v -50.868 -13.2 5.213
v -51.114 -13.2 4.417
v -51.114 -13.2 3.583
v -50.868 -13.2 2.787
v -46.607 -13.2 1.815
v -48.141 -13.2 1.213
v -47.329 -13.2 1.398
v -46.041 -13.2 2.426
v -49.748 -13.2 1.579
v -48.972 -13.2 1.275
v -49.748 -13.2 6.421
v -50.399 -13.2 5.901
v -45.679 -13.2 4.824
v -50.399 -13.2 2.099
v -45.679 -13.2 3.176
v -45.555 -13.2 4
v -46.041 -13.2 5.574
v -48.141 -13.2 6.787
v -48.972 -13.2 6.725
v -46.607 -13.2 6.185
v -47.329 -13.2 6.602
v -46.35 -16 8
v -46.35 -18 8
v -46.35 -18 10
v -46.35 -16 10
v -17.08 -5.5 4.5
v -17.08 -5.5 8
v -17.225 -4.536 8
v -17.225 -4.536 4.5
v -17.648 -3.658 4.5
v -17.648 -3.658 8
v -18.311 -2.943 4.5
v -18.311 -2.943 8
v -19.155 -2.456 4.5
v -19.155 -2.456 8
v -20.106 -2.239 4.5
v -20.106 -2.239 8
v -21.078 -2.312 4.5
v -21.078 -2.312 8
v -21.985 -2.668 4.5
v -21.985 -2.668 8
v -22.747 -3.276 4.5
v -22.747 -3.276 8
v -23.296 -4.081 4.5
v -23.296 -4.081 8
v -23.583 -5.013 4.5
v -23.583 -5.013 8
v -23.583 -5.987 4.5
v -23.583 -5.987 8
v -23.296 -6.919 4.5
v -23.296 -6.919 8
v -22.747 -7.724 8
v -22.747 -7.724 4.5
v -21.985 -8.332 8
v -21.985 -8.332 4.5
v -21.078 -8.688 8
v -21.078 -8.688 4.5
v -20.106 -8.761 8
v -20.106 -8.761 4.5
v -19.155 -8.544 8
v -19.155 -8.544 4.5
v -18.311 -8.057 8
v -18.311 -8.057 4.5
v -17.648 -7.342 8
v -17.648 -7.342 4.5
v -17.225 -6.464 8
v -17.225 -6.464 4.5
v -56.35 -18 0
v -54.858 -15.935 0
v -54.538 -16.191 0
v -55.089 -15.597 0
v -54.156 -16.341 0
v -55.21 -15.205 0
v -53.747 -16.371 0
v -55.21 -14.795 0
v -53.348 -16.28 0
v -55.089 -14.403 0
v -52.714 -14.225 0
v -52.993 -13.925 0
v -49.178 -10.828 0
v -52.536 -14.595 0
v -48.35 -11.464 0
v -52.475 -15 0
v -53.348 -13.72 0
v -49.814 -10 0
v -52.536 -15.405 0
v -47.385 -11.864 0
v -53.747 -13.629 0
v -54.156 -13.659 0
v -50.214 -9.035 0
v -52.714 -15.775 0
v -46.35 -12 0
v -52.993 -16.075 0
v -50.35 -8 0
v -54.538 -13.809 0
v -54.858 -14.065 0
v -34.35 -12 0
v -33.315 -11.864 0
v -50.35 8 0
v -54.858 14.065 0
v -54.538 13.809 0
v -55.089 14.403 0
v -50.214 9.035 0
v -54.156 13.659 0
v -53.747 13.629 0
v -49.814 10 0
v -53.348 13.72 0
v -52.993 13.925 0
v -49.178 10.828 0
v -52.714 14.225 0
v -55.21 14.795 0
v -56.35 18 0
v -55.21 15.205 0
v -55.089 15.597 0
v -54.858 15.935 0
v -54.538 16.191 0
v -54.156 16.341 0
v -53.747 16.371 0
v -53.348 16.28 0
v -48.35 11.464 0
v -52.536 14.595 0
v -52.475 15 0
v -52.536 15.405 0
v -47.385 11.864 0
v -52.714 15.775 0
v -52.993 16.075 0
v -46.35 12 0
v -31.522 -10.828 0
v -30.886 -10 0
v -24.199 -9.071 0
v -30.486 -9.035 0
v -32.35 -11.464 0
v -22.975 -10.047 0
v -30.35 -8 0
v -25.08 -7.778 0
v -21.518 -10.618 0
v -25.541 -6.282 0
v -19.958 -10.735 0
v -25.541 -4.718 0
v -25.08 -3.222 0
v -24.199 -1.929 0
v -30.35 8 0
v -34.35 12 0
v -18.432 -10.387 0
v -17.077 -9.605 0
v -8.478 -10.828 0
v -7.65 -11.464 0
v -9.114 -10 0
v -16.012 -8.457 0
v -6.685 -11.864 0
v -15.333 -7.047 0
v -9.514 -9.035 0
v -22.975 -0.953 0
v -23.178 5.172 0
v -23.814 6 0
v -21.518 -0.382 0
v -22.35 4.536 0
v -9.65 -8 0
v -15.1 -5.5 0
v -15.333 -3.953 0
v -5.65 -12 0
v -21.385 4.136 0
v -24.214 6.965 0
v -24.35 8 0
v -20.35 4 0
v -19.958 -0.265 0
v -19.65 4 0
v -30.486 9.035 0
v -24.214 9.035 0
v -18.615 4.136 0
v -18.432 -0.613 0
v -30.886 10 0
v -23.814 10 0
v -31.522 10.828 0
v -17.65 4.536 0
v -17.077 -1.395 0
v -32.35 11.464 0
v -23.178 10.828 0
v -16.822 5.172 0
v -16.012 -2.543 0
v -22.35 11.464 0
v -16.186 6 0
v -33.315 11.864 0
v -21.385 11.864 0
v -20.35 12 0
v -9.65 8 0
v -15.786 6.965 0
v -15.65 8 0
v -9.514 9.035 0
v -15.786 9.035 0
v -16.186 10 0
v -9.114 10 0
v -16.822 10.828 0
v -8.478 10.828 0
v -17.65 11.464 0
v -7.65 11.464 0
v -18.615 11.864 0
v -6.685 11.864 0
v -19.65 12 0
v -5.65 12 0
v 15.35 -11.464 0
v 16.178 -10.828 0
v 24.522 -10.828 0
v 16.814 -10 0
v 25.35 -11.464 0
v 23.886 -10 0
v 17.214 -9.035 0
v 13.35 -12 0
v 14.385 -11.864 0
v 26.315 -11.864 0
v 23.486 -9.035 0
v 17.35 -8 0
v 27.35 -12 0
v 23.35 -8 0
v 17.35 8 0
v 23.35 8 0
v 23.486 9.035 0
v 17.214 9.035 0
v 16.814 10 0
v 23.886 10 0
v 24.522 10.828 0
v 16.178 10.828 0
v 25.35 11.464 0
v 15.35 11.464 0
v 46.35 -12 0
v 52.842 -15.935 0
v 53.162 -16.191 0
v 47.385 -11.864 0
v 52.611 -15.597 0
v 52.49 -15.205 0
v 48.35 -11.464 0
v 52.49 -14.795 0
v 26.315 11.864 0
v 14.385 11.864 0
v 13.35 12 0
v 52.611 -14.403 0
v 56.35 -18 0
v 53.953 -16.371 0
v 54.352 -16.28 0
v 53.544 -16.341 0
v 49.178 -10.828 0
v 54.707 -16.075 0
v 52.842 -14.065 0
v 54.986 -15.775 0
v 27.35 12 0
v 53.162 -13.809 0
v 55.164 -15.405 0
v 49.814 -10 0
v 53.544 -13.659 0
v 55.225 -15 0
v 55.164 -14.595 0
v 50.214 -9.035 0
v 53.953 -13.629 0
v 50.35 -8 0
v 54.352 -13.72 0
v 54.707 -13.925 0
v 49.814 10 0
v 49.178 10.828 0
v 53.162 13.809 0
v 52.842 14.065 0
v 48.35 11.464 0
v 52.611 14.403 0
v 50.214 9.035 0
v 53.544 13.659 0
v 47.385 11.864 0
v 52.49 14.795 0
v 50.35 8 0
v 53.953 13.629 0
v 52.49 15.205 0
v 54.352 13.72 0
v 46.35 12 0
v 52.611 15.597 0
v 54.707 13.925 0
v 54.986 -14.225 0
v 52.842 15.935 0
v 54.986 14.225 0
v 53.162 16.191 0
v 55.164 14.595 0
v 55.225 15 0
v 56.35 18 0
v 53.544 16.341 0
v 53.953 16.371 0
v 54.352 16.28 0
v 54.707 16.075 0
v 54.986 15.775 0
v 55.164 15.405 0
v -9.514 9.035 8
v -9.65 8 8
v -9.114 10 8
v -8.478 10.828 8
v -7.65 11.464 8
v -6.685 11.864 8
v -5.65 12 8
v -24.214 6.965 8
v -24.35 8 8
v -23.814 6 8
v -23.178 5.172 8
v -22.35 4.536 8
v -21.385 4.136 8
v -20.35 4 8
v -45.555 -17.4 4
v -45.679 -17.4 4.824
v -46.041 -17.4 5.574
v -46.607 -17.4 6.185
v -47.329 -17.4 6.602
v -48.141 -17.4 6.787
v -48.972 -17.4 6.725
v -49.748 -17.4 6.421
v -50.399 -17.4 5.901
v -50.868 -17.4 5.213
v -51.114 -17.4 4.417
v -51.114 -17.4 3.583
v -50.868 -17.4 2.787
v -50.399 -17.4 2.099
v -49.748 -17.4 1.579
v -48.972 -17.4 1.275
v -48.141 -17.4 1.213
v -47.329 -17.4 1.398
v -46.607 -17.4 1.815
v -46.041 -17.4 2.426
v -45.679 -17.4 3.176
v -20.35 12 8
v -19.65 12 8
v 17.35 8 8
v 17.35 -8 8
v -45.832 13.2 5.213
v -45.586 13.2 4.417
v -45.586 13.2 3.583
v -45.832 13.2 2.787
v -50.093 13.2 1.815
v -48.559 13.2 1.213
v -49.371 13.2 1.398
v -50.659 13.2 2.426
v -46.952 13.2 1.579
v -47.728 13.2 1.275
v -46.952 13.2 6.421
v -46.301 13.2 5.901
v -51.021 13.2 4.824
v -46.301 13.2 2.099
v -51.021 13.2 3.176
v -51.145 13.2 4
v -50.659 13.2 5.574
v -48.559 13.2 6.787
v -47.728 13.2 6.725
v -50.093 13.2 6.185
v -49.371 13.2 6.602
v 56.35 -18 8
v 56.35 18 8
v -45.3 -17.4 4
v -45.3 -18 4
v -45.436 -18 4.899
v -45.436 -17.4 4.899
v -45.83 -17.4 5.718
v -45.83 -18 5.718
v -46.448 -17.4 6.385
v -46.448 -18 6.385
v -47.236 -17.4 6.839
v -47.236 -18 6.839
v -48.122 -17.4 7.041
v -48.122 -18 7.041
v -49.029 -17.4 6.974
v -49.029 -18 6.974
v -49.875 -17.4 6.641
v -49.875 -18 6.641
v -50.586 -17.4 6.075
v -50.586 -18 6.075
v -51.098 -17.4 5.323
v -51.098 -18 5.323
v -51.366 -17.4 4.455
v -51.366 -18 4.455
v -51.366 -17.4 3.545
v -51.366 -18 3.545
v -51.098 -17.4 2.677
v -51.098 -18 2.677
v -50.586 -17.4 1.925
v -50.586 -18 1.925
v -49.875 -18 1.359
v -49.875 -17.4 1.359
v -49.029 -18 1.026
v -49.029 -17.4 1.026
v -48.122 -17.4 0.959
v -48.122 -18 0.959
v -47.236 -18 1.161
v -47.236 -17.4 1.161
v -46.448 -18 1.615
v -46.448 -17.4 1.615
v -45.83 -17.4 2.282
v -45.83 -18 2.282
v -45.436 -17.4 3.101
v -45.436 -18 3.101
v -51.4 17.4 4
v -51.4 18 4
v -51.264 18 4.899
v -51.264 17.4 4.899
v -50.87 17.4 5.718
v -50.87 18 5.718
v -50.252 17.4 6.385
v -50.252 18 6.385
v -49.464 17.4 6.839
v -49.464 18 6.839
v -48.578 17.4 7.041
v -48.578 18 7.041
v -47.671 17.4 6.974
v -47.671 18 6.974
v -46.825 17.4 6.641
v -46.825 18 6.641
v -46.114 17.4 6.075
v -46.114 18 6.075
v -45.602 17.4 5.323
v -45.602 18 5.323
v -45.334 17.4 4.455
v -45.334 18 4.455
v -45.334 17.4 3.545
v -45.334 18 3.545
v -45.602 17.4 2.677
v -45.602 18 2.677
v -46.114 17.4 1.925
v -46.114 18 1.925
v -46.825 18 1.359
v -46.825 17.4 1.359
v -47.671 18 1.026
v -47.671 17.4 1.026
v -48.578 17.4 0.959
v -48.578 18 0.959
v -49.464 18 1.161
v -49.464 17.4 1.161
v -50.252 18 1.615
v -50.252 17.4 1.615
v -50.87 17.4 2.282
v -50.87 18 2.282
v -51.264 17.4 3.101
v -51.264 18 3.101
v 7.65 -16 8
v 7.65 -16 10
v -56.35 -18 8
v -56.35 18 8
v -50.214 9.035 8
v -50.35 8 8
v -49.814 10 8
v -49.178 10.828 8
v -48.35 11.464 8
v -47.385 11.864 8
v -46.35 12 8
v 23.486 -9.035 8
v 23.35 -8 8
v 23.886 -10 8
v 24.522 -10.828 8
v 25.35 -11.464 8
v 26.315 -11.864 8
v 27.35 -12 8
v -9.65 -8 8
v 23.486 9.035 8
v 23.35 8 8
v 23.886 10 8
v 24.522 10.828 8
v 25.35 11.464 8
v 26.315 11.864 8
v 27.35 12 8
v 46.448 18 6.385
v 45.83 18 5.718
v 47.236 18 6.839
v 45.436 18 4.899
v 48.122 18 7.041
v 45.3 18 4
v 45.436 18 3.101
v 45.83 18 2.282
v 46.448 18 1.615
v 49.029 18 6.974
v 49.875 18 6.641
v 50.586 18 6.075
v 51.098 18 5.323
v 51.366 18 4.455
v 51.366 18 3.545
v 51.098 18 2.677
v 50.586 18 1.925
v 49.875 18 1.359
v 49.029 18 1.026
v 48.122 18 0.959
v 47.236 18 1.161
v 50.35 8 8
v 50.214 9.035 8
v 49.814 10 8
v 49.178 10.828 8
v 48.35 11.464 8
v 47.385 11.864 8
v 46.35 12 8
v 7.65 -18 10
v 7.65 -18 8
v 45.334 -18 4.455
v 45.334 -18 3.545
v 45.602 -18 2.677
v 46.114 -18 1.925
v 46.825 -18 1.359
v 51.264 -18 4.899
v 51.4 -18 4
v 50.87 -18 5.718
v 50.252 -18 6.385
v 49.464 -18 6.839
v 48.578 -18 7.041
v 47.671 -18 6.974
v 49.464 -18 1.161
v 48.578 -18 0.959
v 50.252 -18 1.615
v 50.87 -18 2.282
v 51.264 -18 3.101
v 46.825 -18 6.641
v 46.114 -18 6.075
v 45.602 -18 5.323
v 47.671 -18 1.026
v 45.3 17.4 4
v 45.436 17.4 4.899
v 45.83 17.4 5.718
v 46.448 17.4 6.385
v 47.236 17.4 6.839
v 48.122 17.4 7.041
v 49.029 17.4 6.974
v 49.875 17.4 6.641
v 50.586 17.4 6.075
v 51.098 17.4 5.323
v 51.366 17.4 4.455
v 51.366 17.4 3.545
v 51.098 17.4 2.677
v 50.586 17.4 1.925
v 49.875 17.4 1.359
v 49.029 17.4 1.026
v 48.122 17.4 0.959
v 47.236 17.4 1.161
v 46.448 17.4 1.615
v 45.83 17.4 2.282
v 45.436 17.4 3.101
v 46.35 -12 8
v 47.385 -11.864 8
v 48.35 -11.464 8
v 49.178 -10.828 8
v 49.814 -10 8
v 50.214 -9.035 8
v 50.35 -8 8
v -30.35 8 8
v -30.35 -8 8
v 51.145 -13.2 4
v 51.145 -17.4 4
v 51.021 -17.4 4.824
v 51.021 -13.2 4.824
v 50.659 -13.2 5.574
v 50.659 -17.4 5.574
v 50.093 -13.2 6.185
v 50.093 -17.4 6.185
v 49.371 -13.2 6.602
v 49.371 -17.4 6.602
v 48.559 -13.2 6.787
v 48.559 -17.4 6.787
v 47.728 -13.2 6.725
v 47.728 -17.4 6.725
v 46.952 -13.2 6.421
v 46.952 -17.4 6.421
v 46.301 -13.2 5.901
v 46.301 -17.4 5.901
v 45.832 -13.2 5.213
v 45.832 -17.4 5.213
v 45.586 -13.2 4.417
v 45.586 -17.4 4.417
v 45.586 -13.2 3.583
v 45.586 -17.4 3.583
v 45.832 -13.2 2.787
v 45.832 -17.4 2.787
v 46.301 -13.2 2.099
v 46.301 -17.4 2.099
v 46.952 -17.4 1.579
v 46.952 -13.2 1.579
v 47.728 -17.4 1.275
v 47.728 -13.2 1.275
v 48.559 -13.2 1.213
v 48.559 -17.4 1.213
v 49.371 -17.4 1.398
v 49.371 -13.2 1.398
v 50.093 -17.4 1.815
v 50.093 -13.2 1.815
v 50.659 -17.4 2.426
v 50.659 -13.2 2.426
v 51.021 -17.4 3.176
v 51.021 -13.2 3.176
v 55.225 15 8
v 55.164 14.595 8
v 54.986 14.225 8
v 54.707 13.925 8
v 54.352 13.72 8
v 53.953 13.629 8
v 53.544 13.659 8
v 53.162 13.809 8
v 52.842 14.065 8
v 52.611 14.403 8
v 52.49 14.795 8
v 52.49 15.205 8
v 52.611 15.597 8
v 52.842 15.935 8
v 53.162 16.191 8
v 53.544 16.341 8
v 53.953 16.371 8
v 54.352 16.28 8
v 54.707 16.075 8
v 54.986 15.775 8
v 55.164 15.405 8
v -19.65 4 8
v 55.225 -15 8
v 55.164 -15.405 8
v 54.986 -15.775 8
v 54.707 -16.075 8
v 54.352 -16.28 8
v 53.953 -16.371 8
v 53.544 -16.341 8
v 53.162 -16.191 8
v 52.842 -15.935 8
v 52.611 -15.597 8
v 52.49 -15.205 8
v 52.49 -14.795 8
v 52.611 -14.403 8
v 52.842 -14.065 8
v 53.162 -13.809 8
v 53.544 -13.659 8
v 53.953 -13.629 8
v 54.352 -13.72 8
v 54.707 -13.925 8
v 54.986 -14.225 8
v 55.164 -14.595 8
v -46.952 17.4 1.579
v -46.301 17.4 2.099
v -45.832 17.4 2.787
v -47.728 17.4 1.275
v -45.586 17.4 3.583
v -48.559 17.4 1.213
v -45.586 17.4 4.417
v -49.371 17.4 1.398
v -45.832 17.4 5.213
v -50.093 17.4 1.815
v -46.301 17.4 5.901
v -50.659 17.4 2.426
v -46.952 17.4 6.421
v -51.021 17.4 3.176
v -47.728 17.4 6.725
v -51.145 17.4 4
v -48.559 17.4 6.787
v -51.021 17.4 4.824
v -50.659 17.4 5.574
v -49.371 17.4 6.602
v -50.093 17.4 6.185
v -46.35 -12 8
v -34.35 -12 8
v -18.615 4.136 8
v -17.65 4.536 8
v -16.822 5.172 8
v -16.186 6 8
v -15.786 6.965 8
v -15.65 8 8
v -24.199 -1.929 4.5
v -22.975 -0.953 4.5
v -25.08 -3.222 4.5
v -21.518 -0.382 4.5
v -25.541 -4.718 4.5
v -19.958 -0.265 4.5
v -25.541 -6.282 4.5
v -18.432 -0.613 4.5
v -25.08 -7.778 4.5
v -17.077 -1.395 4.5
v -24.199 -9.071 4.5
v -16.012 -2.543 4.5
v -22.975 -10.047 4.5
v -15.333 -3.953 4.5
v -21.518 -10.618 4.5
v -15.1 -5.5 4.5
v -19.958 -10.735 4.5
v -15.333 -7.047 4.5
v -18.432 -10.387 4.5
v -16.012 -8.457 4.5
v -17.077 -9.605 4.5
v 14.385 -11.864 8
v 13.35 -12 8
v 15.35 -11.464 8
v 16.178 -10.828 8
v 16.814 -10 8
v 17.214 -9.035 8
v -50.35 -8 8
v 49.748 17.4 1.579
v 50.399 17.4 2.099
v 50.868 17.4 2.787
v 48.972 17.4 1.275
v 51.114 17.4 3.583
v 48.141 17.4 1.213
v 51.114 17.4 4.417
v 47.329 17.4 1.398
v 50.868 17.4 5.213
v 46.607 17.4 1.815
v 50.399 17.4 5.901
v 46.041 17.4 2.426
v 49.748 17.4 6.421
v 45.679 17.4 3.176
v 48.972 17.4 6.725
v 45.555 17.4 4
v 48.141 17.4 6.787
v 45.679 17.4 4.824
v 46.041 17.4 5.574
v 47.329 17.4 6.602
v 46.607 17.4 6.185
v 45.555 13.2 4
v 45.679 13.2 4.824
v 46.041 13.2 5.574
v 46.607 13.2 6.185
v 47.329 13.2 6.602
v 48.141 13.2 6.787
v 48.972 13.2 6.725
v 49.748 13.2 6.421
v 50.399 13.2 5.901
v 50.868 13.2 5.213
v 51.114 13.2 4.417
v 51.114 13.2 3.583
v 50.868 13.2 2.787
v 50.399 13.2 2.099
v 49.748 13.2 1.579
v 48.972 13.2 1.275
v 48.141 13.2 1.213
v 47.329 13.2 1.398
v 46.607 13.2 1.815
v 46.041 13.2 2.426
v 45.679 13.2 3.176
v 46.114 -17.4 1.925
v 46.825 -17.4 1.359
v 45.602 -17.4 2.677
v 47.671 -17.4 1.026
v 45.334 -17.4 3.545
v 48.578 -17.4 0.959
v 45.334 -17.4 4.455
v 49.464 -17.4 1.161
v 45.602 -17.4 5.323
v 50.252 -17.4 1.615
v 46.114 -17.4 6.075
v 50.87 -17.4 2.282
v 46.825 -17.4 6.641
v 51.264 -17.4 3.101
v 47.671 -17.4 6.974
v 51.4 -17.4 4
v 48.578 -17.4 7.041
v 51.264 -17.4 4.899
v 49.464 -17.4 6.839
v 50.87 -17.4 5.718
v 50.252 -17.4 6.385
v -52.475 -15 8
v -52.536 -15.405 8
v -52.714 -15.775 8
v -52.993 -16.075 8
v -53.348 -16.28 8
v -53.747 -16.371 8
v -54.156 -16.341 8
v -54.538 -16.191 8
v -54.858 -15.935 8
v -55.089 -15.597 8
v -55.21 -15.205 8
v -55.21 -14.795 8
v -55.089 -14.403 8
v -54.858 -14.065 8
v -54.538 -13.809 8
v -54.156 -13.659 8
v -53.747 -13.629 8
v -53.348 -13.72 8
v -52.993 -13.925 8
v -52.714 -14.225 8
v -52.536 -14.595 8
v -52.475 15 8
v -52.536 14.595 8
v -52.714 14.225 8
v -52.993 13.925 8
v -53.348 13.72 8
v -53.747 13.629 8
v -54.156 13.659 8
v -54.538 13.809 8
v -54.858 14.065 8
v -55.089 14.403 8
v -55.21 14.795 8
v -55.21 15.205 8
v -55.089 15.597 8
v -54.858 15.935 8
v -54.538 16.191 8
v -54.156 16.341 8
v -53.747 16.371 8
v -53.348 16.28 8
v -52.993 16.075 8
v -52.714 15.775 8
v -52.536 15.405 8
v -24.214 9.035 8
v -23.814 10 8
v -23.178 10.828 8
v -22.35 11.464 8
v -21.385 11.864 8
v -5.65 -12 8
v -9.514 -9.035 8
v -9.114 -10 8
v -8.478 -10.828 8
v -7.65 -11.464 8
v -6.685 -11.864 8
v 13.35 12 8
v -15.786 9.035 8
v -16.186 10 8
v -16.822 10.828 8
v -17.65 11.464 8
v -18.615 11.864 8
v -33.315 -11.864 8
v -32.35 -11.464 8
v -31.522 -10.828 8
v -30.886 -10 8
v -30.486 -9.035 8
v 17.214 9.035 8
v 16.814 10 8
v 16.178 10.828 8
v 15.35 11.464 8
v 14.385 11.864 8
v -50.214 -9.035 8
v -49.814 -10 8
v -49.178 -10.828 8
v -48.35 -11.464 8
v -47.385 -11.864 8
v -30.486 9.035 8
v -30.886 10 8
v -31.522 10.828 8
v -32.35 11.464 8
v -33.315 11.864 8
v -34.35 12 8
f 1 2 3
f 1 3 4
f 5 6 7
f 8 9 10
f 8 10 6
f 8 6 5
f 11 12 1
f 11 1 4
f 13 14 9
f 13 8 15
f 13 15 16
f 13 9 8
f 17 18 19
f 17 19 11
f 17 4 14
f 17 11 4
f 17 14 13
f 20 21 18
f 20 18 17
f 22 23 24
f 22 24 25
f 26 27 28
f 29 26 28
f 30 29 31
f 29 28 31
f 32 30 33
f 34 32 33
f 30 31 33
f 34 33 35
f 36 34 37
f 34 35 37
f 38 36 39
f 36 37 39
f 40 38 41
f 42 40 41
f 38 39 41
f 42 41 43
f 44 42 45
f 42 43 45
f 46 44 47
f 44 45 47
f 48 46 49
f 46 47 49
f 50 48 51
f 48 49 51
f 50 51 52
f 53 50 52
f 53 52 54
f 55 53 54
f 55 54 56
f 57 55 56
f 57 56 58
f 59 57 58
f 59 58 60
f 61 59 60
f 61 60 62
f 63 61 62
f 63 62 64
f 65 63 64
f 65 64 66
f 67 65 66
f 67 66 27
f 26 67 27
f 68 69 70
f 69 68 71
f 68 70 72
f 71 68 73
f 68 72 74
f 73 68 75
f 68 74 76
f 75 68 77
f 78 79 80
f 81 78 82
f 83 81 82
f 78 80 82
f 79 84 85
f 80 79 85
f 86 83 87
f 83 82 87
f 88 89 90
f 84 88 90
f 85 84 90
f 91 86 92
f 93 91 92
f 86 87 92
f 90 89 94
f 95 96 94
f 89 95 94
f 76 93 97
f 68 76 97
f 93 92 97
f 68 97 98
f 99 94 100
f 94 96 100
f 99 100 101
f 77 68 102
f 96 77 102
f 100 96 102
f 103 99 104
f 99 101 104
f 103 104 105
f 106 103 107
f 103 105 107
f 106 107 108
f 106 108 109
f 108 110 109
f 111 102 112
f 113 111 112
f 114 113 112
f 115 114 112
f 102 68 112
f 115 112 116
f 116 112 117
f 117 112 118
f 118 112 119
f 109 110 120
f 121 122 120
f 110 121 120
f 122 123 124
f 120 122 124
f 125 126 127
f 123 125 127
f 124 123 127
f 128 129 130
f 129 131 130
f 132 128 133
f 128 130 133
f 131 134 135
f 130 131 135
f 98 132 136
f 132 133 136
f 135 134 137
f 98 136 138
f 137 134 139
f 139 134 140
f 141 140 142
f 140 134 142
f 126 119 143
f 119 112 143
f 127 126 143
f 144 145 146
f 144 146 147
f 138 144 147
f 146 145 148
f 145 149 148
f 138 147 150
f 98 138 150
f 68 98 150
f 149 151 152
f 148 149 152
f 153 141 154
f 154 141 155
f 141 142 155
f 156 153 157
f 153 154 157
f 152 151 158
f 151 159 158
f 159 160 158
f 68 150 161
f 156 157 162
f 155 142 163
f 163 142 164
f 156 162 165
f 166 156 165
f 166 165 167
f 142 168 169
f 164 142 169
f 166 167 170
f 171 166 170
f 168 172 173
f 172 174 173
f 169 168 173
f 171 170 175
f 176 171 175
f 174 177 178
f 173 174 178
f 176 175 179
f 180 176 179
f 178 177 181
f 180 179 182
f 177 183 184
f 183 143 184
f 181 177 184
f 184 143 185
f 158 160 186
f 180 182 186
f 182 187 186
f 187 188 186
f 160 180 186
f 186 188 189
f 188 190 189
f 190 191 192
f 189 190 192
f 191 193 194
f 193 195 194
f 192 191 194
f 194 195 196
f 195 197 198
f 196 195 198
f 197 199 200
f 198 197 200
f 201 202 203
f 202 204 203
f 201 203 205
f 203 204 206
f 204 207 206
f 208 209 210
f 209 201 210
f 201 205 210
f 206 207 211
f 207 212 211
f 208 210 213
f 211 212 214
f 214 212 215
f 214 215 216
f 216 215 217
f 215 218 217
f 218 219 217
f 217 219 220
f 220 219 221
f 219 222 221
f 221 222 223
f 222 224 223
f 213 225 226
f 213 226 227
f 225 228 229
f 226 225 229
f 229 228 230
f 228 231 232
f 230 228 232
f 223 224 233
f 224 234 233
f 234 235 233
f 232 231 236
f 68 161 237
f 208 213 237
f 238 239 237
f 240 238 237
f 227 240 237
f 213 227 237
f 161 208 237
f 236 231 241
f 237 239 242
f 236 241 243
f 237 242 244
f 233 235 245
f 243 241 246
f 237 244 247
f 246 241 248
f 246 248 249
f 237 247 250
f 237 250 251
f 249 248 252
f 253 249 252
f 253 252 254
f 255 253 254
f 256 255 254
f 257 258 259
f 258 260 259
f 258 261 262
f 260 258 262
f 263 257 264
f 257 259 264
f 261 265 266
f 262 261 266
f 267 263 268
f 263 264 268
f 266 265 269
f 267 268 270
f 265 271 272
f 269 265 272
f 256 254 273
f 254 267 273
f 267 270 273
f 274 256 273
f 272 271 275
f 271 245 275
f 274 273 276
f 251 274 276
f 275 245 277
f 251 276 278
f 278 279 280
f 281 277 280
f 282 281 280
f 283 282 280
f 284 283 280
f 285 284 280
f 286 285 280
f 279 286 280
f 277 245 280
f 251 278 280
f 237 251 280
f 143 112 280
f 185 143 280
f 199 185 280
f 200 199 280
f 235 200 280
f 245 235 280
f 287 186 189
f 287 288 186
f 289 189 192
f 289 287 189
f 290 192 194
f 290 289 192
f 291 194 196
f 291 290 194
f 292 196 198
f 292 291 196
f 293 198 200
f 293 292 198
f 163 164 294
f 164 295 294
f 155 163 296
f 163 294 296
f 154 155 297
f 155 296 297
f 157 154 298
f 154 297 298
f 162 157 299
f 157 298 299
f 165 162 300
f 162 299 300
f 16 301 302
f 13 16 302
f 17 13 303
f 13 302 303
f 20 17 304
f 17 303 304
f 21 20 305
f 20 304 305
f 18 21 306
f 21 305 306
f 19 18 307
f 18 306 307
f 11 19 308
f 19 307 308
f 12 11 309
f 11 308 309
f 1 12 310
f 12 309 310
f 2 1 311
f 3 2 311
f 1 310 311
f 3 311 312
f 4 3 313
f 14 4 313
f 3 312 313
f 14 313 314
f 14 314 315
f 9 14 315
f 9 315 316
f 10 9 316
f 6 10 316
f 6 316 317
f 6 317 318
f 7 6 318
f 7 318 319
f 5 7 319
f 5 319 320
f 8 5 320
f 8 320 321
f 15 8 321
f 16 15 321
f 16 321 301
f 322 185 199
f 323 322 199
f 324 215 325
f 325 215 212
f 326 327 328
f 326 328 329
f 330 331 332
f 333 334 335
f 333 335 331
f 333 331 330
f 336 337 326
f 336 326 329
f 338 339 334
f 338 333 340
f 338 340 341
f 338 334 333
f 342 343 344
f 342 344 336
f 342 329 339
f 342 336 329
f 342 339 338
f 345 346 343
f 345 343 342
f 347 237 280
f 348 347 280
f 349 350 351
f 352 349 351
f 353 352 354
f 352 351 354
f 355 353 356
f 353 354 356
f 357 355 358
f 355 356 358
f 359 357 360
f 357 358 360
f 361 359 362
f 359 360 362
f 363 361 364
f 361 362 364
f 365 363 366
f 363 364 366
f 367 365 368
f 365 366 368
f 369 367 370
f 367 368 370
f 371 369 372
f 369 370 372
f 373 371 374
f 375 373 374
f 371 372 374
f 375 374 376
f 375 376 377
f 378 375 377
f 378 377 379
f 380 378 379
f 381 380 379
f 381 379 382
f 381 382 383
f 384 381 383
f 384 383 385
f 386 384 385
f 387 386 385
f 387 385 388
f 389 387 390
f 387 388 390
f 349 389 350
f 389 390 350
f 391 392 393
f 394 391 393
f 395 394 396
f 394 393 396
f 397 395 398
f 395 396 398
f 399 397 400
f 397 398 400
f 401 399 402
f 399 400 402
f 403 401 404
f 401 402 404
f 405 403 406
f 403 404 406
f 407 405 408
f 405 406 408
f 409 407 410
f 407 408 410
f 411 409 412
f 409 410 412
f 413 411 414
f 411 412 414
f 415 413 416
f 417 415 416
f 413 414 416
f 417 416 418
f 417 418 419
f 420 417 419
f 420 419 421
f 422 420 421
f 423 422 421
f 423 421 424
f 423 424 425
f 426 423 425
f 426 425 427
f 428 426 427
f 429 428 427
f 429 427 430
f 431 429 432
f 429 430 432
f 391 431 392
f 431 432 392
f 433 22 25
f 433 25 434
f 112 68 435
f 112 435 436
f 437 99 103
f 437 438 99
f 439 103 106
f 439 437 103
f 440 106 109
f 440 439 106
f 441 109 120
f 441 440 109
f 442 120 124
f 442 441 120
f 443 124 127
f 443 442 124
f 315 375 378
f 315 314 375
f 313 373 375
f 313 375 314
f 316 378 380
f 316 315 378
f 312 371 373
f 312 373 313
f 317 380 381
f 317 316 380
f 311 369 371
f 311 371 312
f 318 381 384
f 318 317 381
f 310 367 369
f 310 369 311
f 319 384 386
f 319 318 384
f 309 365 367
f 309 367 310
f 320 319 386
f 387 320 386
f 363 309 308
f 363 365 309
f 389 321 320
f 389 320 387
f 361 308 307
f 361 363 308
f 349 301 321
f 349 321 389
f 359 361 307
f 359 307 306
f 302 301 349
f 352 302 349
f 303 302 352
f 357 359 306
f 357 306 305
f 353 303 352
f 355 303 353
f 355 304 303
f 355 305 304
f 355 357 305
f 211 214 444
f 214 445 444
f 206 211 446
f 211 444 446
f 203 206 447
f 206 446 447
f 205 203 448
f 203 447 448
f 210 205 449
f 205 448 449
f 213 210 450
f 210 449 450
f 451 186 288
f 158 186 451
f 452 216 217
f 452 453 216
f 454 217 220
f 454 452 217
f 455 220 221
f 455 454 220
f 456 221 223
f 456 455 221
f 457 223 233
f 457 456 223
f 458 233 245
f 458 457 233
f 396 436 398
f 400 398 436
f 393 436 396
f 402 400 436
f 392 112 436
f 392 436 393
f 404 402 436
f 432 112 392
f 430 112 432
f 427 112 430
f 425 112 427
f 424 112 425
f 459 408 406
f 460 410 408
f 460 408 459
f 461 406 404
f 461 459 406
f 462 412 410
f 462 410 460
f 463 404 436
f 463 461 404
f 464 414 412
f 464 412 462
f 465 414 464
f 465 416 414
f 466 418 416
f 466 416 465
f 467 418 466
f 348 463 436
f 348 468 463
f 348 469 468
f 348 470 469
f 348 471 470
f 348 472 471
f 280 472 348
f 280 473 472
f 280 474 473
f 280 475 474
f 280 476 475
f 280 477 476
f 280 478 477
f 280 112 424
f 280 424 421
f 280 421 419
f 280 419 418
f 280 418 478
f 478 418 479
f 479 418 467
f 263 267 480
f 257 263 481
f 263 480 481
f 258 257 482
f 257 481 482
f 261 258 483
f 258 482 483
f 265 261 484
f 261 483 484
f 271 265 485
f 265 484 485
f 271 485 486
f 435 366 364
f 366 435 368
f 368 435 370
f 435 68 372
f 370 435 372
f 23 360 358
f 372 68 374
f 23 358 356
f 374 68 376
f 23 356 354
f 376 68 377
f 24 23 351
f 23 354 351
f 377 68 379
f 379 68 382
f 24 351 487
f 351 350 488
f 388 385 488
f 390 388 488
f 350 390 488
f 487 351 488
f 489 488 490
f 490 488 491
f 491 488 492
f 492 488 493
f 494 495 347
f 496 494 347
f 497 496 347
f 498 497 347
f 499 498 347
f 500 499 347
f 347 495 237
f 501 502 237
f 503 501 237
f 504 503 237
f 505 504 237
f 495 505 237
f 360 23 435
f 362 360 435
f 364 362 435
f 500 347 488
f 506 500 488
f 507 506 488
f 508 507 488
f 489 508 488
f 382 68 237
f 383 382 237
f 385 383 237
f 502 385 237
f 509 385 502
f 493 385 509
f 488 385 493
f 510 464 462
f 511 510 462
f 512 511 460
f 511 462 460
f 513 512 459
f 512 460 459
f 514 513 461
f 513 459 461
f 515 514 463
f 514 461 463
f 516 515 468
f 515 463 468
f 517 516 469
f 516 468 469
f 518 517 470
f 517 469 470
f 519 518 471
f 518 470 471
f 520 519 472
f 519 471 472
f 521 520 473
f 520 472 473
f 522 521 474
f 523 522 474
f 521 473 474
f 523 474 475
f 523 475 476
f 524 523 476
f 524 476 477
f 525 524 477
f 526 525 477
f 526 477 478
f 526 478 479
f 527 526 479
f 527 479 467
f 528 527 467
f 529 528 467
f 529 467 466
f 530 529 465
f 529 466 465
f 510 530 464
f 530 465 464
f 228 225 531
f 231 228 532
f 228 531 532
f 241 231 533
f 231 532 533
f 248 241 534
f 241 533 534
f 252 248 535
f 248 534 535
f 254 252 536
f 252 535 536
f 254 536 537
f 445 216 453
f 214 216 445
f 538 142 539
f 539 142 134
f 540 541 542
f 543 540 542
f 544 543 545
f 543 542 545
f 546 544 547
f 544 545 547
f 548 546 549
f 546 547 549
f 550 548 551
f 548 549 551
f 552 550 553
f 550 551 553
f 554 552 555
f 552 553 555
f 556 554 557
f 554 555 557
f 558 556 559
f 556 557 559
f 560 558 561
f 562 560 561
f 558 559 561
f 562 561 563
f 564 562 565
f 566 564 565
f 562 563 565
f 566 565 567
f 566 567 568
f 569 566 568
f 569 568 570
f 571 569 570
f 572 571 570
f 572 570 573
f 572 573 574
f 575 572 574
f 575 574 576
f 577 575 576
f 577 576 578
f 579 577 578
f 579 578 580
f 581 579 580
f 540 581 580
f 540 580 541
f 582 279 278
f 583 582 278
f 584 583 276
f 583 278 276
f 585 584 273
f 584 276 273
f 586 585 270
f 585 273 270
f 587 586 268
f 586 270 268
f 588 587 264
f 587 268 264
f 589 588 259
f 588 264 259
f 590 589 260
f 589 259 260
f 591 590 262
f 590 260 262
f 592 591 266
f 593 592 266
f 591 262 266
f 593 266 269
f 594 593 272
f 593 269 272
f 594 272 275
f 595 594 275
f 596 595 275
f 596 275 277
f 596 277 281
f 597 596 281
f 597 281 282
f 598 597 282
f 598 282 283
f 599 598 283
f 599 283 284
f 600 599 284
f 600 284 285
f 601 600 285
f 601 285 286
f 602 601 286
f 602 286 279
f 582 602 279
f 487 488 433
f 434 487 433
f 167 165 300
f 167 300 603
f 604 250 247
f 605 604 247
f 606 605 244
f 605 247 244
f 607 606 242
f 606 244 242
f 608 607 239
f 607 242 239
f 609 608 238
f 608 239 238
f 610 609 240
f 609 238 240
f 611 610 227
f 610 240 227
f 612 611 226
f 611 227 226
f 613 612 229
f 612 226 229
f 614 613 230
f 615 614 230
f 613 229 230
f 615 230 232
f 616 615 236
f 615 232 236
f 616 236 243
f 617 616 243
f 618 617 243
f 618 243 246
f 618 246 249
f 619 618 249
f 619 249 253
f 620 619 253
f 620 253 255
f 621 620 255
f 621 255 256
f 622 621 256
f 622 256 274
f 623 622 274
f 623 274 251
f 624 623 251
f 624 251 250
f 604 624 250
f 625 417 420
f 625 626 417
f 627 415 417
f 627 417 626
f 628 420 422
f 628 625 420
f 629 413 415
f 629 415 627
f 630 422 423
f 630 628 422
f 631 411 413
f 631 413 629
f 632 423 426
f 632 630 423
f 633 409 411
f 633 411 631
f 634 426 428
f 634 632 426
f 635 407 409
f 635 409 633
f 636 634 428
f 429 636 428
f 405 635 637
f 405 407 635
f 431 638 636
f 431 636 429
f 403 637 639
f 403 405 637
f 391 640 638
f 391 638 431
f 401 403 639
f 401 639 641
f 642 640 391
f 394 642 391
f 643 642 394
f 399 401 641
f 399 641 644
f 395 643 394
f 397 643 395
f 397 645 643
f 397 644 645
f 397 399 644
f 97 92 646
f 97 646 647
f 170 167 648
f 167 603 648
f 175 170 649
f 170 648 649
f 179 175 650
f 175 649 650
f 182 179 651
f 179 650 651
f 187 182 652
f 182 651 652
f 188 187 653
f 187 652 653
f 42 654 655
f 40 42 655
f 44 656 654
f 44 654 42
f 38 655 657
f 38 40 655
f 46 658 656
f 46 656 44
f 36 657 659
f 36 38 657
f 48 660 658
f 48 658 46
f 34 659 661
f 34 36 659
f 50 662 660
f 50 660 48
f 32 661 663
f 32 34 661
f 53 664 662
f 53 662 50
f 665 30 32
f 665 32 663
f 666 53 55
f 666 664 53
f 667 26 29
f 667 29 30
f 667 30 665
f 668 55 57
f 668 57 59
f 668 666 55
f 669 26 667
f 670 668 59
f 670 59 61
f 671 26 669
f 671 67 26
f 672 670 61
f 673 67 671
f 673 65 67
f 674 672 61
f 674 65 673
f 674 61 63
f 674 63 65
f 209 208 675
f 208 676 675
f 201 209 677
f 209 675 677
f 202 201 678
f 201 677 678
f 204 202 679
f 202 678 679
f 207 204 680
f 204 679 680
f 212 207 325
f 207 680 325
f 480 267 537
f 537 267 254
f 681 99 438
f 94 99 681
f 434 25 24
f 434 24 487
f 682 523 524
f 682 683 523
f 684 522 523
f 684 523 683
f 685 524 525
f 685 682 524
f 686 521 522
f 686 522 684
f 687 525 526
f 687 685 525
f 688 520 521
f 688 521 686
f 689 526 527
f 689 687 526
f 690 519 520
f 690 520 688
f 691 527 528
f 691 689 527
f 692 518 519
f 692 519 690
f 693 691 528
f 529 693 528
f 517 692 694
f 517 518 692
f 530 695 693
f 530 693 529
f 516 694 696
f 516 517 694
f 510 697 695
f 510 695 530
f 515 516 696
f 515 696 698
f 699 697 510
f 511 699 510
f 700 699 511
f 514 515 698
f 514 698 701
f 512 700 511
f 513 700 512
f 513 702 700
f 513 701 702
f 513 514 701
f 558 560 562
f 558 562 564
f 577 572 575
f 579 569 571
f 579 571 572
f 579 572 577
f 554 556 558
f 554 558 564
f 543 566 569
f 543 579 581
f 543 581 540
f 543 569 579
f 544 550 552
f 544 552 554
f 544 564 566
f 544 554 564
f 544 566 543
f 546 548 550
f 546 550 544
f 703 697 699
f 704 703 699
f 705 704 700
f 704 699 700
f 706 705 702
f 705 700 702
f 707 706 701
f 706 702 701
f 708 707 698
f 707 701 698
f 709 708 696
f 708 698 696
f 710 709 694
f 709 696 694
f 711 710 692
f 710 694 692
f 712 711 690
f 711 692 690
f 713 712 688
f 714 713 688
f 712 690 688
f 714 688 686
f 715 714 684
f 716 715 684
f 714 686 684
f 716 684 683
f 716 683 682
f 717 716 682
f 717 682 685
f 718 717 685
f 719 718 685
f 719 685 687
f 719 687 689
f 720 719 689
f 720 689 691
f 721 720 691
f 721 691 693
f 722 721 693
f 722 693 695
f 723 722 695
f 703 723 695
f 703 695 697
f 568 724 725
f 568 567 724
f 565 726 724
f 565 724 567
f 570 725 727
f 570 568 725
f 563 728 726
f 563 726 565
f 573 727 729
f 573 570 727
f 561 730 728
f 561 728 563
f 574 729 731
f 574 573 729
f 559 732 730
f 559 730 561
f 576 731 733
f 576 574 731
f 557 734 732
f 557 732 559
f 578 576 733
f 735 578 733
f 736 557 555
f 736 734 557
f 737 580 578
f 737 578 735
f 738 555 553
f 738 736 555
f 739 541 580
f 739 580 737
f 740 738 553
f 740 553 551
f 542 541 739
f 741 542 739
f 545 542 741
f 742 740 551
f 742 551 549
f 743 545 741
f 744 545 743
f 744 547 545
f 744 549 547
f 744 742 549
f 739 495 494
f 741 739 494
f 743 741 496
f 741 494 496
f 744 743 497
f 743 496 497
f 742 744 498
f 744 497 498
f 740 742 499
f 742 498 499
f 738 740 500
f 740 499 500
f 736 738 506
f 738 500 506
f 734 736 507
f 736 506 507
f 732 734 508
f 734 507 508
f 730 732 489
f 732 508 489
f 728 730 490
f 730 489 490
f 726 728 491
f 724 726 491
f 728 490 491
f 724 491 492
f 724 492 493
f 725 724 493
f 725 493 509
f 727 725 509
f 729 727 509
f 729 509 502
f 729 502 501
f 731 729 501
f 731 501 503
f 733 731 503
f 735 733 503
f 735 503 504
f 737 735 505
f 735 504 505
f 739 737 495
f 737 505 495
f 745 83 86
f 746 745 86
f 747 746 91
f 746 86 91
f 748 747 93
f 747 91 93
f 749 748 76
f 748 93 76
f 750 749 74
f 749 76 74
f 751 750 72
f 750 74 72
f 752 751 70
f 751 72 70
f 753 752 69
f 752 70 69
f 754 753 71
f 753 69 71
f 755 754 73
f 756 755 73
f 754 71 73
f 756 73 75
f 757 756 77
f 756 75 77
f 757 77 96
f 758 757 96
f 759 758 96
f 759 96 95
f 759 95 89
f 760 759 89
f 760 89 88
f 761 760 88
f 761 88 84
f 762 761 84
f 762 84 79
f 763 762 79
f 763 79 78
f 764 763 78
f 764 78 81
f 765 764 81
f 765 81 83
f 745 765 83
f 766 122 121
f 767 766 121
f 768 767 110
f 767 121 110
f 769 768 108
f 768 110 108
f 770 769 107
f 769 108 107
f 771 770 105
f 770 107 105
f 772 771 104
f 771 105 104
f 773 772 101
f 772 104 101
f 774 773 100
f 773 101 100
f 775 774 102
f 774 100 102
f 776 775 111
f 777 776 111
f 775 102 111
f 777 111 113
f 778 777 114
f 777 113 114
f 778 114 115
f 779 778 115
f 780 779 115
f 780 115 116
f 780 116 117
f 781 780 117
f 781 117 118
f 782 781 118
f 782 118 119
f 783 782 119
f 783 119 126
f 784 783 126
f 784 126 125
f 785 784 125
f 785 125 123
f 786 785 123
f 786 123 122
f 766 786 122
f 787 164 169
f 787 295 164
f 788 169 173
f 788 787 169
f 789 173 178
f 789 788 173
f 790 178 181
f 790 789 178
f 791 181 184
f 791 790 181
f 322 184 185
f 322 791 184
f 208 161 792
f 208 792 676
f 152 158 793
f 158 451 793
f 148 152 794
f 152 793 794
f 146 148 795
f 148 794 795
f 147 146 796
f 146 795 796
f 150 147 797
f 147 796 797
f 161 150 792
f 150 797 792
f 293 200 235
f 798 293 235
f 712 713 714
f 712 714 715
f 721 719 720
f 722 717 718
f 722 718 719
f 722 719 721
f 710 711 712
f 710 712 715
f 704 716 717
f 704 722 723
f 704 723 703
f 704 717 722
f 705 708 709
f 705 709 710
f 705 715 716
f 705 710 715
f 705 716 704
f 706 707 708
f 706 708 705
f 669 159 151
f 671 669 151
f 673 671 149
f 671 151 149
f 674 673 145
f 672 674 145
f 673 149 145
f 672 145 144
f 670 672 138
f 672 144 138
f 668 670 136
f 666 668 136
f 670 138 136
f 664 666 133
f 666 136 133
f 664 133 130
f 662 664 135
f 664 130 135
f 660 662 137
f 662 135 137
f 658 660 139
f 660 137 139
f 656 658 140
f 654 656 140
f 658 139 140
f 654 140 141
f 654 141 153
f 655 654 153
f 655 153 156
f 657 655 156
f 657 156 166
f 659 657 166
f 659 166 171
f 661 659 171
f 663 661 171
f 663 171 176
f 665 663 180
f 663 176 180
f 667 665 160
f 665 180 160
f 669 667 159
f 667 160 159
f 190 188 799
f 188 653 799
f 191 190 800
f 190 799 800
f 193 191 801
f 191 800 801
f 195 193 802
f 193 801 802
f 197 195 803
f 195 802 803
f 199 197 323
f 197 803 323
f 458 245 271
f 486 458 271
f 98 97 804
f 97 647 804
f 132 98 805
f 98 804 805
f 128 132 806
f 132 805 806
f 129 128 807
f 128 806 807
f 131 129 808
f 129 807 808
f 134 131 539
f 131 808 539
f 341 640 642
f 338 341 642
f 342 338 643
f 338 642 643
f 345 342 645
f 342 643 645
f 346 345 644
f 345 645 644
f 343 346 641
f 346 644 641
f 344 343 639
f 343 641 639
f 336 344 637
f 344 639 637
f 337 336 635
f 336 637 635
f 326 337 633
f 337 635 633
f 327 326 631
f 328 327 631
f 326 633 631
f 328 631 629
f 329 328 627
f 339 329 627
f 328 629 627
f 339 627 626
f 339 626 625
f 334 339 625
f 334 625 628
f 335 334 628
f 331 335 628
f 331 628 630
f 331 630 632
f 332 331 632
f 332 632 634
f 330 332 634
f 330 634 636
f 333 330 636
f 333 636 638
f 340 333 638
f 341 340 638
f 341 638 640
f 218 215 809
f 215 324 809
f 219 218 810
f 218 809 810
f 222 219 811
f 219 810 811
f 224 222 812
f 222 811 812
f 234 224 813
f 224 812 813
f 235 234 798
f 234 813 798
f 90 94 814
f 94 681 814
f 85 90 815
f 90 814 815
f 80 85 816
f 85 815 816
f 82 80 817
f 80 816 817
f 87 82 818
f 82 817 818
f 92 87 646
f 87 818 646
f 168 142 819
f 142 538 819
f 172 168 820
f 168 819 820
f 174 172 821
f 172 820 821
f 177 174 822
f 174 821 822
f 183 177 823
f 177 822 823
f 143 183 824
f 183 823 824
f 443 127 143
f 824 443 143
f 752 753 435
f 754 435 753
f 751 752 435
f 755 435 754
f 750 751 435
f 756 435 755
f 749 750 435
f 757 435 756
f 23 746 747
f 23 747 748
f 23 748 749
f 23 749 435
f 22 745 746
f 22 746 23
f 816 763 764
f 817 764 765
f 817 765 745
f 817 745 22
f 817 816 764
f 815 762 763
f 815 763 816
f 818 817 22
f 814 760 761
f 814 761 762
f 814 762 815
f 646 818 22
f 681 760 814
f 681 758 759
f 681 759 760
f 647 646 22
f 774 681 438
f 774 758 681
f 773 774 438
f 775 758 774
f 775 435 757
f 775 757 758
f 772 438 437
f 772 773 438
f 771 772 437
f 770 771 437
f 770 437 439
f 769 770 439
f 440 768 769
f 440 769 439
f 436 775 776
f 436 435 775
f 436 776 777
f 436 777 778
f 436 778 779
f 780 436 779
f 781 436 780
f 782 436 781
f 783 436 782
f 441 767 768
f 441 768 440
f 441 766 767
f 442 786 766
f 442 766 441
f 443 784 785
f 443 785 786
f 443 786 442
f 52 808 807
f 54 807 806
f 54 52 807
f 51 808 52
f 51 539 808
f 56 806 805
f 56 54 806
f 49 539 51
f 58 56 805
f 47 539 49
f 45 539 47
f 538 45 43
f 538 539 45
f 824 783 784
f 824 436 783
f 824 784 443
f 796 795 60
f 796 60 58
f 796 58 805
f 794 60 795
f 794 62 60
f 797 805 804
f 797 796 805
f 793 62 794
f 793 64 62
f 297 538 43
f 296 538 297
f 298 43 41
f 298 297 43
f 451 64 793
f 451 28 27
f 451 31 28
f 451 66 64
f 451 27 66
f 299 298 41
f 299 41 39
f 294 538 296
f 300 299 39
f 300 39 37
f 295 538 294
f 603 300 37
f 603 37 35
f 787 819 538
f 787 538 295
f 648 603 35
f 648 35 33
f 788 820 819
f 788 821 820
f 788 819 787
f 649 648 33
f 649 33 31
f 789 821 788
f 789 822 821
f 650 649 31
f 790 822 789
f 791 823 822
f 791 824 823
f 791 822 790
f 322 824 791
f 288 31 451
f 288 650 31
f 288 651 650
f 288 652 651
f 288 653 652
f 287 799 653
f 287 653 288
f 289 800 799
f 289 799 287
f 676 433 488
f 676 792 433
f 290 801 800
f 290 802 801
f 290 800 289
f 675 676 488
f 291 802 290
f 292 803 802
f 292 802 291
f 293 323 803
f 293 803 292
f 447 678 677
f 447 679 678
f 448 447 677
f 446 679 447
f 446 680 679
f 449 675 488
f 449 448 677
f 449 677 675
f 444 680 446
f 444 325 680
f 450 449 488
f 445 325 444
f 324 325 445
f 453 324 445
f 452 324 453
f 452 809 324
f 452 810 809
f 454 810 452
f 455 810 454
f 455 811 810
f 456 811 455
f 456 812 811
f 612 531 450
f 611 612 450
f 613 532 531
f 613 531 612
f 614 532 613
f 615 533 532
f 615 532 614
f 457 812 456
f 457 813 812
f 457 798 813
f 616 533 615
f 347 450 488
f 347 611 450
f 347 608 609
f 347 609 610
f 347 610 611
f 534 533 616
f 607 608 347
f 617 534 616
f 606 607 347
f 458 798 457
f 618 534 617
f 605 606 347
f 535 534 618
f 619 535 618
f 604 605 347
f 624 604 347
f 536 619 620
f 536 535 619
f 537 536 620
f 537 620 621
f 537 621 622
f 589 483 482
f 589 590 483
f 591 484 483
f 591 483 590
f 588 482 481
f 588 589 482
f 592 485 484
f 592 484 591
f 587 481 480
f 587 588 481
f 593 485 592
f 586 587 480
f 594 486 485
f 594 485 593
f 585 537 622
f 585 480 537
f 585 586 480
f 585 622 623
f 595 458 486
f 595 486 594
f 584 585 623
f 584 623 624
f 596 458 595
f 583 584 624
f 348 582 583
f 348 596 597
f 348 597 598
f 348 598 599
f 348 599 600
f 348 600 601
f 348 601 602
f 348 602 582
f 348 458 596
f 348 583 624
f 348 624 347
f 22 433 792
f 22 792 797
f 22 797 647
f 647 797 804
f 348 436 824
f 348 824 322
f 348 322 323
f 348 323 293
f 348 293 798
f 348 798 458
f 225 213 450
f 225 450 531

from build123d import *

# Parameters (mm, degrees)
F0_W      = 112.7
F0_H      = 36
F1_DEPTH  = 8
F3_W      = 54
F3_H      = 2
F4_DEPTH  = 2
F5_R      = 3.27
F6_DEPTH  = 8.001
F7_R      = 1.375
F8_DEPTH  = 10.001
F10_R     = 5.25
F11_DEPTH = 4.5
F9_W      = 20
F9_H      = 24
F9_W_2    = 27
F9_W_3    = 8.7
F9_H_2    = 8
F12_DEPTH = 10.001
F13_R     = 3.99999
F14_R     = 2.795
F15_DEPTH = 4.8
F16_R     = 2.795
F17_DEPTH = 4.8
F18_R     = 3.05
F19_DEPTH = 0.6
F20_R     = 3.05
F21_DEPTH = 0.6


# Not quite as in the source:
# - a fillet or chamfer is up to 0.001 mm smaller than in the source, because OpenCascade refuses the exact size


with BuildPart() as f1:
    # F0 (on Top) → F1 (new body)
    with BuildSketch(Plane.XY):
        Rectangle(F0_W, F0_H)
    extrude(amount=F1_DEPTH)

    # F3 (on face) → F4 (join)
    with BuildSketch(Plane.XY.offset(8)):
        with Locations((-19.35, -17)):
            Rectangle(F3_W, F3_H)
    extrude(amount=F4_DEPTH)

    # F5 (on face) → F6 (cut, through all)
    with BuildSketch(Plane.XY.offset(8)):
        with Locations((-20.35, -5.5)):
            Circle(F5_R)
    extrude(amount=-F6_DEPTH, mode=Mode.SUBTRACT)

    # F7 (on face) → F8 (cut, through all)
    with BuildSketch(Plane(origin=(0, 0, 0), x_dir=(1, 0, 0), z_dir=(0, 0, -1))):
        with Locations((-53.85, 15)):
            Circle(F7_R)
        with Locations((-53.85, -15)):
            Circle(F7_R)
        with Locations((53.85, 15)):
            Circle(F7_R)
        with Locations((53.85, -15)):
            Circle(F7_R)
    extrude(amount=-F8_DEPTH, mode=Mode.SUBTRACT)

    # F10 (on face) → F11 (cut)
    with BuildSketch(Plane(origin=(0, 0, 0), x_dir=(1, 0, 0), z_dir=(0, 0, -1))):
        with Locations((-20.35, 5.5)):
            Circle(F10_R)
    extrude(amount=-F11_DEPTH, mode=Mode.SUBTRACT)

    # F9 (on face) → F12 (cut, through all)
    with BuildSketch(Plane(origin=(0, 0, 0), x_dir=(1, 0, 0), z_dir=(0, 0, -1))):
        with Locations((-40.35, 0)):
            Rectangle(F9_W, F9_H)
        with Locations((3.85, 0)):
            Rectangle(F9_W_2, F9_H)
        with Locations((36.85, 0)):
            Rectangle(F9_W_2, F9_H)
        with Locations((-20, -8)):
            Rectangle(F9_W_3, F9_H_2)
    extrude(amount=-F12_DEPTH, mode=Mode.SUBTRACT)

    # F13 (radius 4 in the source; OpenCascade refuses exactly that, so slightly less here)
    f13_edges = [f1.edges().sort_by_distance(p)[0] for p in [
        (-30.35, -12, 4),
        (-50.35, -12, 4),
        (-50.35, 12, 4),
        (-30.35, 12, 4),
        (-24.35, 4, 4),
        (-9.65, -12, 4),
        (23.35, -12, 4),
        (-9.65, 12, 4),
        (-24.35, 12, 4),
        (17.35, -12, 4),
        (50.35, -12, 4),
        (50.35, 12, 4),
        (23.35, 12, 4),
        (-15.65, 4, 4),
        (-15.65, 12, 4),
        (17.35, 12, 4),
    ]]
    fillet(f13_edges, radius=F13_R)

    # F14 (on face) → F15 (cut)
    with BuildSketch(Plane.XZ.offset(18)):
        with Locations((48.35, 4)):
            Circle(F14_R)
        with Locations((-48.35, 4)):
            Circle(F14_R)
    extrude(amount=-F15_DEPTH, mode=Mode.SUBTRACT)

    # F16 (on face) → F17 (cut)
    with BuildSketch(Plane(origin=(0, 18, 0), x_dir=(-1, 0, 0), z_dir=(0, 1, 0))):
        with Locations((48.35, 4)):
            Circle(F16_R)
        with Locations((-48.35, 4)):
            Circle(F16_R)
    extrude(amount=-F17_DEPTH, mode=Mode.SUBTRACT)

    # F18 (on face) → F19 (cut)
    with BuildSketch(Plane.XZ.offset(18)):
        with Locations((-48.35, 4)):
            Circle(F18_R)
        with Locations((48.35, 4)):
            Circle(F18_R)
    extrude(amount=-F19_DEPTH, mode=Mode.SUBTRACT)

    # F20 (on face) → F21 (cut)
    with BuildSketch(Plane(origin=(0, 18, 0), x_dir=(-1, 0, 0), z_dir=(0, 1, 0))):
        with Locations((-48.35, 4)):
            Circle(F20_R)
        with Locations((48.35, 4)):
            Circle(F20_R)
    extrude(amount=-F21_DEPTH, mode=Mode.SUBTRACT)


solid = f1.part
